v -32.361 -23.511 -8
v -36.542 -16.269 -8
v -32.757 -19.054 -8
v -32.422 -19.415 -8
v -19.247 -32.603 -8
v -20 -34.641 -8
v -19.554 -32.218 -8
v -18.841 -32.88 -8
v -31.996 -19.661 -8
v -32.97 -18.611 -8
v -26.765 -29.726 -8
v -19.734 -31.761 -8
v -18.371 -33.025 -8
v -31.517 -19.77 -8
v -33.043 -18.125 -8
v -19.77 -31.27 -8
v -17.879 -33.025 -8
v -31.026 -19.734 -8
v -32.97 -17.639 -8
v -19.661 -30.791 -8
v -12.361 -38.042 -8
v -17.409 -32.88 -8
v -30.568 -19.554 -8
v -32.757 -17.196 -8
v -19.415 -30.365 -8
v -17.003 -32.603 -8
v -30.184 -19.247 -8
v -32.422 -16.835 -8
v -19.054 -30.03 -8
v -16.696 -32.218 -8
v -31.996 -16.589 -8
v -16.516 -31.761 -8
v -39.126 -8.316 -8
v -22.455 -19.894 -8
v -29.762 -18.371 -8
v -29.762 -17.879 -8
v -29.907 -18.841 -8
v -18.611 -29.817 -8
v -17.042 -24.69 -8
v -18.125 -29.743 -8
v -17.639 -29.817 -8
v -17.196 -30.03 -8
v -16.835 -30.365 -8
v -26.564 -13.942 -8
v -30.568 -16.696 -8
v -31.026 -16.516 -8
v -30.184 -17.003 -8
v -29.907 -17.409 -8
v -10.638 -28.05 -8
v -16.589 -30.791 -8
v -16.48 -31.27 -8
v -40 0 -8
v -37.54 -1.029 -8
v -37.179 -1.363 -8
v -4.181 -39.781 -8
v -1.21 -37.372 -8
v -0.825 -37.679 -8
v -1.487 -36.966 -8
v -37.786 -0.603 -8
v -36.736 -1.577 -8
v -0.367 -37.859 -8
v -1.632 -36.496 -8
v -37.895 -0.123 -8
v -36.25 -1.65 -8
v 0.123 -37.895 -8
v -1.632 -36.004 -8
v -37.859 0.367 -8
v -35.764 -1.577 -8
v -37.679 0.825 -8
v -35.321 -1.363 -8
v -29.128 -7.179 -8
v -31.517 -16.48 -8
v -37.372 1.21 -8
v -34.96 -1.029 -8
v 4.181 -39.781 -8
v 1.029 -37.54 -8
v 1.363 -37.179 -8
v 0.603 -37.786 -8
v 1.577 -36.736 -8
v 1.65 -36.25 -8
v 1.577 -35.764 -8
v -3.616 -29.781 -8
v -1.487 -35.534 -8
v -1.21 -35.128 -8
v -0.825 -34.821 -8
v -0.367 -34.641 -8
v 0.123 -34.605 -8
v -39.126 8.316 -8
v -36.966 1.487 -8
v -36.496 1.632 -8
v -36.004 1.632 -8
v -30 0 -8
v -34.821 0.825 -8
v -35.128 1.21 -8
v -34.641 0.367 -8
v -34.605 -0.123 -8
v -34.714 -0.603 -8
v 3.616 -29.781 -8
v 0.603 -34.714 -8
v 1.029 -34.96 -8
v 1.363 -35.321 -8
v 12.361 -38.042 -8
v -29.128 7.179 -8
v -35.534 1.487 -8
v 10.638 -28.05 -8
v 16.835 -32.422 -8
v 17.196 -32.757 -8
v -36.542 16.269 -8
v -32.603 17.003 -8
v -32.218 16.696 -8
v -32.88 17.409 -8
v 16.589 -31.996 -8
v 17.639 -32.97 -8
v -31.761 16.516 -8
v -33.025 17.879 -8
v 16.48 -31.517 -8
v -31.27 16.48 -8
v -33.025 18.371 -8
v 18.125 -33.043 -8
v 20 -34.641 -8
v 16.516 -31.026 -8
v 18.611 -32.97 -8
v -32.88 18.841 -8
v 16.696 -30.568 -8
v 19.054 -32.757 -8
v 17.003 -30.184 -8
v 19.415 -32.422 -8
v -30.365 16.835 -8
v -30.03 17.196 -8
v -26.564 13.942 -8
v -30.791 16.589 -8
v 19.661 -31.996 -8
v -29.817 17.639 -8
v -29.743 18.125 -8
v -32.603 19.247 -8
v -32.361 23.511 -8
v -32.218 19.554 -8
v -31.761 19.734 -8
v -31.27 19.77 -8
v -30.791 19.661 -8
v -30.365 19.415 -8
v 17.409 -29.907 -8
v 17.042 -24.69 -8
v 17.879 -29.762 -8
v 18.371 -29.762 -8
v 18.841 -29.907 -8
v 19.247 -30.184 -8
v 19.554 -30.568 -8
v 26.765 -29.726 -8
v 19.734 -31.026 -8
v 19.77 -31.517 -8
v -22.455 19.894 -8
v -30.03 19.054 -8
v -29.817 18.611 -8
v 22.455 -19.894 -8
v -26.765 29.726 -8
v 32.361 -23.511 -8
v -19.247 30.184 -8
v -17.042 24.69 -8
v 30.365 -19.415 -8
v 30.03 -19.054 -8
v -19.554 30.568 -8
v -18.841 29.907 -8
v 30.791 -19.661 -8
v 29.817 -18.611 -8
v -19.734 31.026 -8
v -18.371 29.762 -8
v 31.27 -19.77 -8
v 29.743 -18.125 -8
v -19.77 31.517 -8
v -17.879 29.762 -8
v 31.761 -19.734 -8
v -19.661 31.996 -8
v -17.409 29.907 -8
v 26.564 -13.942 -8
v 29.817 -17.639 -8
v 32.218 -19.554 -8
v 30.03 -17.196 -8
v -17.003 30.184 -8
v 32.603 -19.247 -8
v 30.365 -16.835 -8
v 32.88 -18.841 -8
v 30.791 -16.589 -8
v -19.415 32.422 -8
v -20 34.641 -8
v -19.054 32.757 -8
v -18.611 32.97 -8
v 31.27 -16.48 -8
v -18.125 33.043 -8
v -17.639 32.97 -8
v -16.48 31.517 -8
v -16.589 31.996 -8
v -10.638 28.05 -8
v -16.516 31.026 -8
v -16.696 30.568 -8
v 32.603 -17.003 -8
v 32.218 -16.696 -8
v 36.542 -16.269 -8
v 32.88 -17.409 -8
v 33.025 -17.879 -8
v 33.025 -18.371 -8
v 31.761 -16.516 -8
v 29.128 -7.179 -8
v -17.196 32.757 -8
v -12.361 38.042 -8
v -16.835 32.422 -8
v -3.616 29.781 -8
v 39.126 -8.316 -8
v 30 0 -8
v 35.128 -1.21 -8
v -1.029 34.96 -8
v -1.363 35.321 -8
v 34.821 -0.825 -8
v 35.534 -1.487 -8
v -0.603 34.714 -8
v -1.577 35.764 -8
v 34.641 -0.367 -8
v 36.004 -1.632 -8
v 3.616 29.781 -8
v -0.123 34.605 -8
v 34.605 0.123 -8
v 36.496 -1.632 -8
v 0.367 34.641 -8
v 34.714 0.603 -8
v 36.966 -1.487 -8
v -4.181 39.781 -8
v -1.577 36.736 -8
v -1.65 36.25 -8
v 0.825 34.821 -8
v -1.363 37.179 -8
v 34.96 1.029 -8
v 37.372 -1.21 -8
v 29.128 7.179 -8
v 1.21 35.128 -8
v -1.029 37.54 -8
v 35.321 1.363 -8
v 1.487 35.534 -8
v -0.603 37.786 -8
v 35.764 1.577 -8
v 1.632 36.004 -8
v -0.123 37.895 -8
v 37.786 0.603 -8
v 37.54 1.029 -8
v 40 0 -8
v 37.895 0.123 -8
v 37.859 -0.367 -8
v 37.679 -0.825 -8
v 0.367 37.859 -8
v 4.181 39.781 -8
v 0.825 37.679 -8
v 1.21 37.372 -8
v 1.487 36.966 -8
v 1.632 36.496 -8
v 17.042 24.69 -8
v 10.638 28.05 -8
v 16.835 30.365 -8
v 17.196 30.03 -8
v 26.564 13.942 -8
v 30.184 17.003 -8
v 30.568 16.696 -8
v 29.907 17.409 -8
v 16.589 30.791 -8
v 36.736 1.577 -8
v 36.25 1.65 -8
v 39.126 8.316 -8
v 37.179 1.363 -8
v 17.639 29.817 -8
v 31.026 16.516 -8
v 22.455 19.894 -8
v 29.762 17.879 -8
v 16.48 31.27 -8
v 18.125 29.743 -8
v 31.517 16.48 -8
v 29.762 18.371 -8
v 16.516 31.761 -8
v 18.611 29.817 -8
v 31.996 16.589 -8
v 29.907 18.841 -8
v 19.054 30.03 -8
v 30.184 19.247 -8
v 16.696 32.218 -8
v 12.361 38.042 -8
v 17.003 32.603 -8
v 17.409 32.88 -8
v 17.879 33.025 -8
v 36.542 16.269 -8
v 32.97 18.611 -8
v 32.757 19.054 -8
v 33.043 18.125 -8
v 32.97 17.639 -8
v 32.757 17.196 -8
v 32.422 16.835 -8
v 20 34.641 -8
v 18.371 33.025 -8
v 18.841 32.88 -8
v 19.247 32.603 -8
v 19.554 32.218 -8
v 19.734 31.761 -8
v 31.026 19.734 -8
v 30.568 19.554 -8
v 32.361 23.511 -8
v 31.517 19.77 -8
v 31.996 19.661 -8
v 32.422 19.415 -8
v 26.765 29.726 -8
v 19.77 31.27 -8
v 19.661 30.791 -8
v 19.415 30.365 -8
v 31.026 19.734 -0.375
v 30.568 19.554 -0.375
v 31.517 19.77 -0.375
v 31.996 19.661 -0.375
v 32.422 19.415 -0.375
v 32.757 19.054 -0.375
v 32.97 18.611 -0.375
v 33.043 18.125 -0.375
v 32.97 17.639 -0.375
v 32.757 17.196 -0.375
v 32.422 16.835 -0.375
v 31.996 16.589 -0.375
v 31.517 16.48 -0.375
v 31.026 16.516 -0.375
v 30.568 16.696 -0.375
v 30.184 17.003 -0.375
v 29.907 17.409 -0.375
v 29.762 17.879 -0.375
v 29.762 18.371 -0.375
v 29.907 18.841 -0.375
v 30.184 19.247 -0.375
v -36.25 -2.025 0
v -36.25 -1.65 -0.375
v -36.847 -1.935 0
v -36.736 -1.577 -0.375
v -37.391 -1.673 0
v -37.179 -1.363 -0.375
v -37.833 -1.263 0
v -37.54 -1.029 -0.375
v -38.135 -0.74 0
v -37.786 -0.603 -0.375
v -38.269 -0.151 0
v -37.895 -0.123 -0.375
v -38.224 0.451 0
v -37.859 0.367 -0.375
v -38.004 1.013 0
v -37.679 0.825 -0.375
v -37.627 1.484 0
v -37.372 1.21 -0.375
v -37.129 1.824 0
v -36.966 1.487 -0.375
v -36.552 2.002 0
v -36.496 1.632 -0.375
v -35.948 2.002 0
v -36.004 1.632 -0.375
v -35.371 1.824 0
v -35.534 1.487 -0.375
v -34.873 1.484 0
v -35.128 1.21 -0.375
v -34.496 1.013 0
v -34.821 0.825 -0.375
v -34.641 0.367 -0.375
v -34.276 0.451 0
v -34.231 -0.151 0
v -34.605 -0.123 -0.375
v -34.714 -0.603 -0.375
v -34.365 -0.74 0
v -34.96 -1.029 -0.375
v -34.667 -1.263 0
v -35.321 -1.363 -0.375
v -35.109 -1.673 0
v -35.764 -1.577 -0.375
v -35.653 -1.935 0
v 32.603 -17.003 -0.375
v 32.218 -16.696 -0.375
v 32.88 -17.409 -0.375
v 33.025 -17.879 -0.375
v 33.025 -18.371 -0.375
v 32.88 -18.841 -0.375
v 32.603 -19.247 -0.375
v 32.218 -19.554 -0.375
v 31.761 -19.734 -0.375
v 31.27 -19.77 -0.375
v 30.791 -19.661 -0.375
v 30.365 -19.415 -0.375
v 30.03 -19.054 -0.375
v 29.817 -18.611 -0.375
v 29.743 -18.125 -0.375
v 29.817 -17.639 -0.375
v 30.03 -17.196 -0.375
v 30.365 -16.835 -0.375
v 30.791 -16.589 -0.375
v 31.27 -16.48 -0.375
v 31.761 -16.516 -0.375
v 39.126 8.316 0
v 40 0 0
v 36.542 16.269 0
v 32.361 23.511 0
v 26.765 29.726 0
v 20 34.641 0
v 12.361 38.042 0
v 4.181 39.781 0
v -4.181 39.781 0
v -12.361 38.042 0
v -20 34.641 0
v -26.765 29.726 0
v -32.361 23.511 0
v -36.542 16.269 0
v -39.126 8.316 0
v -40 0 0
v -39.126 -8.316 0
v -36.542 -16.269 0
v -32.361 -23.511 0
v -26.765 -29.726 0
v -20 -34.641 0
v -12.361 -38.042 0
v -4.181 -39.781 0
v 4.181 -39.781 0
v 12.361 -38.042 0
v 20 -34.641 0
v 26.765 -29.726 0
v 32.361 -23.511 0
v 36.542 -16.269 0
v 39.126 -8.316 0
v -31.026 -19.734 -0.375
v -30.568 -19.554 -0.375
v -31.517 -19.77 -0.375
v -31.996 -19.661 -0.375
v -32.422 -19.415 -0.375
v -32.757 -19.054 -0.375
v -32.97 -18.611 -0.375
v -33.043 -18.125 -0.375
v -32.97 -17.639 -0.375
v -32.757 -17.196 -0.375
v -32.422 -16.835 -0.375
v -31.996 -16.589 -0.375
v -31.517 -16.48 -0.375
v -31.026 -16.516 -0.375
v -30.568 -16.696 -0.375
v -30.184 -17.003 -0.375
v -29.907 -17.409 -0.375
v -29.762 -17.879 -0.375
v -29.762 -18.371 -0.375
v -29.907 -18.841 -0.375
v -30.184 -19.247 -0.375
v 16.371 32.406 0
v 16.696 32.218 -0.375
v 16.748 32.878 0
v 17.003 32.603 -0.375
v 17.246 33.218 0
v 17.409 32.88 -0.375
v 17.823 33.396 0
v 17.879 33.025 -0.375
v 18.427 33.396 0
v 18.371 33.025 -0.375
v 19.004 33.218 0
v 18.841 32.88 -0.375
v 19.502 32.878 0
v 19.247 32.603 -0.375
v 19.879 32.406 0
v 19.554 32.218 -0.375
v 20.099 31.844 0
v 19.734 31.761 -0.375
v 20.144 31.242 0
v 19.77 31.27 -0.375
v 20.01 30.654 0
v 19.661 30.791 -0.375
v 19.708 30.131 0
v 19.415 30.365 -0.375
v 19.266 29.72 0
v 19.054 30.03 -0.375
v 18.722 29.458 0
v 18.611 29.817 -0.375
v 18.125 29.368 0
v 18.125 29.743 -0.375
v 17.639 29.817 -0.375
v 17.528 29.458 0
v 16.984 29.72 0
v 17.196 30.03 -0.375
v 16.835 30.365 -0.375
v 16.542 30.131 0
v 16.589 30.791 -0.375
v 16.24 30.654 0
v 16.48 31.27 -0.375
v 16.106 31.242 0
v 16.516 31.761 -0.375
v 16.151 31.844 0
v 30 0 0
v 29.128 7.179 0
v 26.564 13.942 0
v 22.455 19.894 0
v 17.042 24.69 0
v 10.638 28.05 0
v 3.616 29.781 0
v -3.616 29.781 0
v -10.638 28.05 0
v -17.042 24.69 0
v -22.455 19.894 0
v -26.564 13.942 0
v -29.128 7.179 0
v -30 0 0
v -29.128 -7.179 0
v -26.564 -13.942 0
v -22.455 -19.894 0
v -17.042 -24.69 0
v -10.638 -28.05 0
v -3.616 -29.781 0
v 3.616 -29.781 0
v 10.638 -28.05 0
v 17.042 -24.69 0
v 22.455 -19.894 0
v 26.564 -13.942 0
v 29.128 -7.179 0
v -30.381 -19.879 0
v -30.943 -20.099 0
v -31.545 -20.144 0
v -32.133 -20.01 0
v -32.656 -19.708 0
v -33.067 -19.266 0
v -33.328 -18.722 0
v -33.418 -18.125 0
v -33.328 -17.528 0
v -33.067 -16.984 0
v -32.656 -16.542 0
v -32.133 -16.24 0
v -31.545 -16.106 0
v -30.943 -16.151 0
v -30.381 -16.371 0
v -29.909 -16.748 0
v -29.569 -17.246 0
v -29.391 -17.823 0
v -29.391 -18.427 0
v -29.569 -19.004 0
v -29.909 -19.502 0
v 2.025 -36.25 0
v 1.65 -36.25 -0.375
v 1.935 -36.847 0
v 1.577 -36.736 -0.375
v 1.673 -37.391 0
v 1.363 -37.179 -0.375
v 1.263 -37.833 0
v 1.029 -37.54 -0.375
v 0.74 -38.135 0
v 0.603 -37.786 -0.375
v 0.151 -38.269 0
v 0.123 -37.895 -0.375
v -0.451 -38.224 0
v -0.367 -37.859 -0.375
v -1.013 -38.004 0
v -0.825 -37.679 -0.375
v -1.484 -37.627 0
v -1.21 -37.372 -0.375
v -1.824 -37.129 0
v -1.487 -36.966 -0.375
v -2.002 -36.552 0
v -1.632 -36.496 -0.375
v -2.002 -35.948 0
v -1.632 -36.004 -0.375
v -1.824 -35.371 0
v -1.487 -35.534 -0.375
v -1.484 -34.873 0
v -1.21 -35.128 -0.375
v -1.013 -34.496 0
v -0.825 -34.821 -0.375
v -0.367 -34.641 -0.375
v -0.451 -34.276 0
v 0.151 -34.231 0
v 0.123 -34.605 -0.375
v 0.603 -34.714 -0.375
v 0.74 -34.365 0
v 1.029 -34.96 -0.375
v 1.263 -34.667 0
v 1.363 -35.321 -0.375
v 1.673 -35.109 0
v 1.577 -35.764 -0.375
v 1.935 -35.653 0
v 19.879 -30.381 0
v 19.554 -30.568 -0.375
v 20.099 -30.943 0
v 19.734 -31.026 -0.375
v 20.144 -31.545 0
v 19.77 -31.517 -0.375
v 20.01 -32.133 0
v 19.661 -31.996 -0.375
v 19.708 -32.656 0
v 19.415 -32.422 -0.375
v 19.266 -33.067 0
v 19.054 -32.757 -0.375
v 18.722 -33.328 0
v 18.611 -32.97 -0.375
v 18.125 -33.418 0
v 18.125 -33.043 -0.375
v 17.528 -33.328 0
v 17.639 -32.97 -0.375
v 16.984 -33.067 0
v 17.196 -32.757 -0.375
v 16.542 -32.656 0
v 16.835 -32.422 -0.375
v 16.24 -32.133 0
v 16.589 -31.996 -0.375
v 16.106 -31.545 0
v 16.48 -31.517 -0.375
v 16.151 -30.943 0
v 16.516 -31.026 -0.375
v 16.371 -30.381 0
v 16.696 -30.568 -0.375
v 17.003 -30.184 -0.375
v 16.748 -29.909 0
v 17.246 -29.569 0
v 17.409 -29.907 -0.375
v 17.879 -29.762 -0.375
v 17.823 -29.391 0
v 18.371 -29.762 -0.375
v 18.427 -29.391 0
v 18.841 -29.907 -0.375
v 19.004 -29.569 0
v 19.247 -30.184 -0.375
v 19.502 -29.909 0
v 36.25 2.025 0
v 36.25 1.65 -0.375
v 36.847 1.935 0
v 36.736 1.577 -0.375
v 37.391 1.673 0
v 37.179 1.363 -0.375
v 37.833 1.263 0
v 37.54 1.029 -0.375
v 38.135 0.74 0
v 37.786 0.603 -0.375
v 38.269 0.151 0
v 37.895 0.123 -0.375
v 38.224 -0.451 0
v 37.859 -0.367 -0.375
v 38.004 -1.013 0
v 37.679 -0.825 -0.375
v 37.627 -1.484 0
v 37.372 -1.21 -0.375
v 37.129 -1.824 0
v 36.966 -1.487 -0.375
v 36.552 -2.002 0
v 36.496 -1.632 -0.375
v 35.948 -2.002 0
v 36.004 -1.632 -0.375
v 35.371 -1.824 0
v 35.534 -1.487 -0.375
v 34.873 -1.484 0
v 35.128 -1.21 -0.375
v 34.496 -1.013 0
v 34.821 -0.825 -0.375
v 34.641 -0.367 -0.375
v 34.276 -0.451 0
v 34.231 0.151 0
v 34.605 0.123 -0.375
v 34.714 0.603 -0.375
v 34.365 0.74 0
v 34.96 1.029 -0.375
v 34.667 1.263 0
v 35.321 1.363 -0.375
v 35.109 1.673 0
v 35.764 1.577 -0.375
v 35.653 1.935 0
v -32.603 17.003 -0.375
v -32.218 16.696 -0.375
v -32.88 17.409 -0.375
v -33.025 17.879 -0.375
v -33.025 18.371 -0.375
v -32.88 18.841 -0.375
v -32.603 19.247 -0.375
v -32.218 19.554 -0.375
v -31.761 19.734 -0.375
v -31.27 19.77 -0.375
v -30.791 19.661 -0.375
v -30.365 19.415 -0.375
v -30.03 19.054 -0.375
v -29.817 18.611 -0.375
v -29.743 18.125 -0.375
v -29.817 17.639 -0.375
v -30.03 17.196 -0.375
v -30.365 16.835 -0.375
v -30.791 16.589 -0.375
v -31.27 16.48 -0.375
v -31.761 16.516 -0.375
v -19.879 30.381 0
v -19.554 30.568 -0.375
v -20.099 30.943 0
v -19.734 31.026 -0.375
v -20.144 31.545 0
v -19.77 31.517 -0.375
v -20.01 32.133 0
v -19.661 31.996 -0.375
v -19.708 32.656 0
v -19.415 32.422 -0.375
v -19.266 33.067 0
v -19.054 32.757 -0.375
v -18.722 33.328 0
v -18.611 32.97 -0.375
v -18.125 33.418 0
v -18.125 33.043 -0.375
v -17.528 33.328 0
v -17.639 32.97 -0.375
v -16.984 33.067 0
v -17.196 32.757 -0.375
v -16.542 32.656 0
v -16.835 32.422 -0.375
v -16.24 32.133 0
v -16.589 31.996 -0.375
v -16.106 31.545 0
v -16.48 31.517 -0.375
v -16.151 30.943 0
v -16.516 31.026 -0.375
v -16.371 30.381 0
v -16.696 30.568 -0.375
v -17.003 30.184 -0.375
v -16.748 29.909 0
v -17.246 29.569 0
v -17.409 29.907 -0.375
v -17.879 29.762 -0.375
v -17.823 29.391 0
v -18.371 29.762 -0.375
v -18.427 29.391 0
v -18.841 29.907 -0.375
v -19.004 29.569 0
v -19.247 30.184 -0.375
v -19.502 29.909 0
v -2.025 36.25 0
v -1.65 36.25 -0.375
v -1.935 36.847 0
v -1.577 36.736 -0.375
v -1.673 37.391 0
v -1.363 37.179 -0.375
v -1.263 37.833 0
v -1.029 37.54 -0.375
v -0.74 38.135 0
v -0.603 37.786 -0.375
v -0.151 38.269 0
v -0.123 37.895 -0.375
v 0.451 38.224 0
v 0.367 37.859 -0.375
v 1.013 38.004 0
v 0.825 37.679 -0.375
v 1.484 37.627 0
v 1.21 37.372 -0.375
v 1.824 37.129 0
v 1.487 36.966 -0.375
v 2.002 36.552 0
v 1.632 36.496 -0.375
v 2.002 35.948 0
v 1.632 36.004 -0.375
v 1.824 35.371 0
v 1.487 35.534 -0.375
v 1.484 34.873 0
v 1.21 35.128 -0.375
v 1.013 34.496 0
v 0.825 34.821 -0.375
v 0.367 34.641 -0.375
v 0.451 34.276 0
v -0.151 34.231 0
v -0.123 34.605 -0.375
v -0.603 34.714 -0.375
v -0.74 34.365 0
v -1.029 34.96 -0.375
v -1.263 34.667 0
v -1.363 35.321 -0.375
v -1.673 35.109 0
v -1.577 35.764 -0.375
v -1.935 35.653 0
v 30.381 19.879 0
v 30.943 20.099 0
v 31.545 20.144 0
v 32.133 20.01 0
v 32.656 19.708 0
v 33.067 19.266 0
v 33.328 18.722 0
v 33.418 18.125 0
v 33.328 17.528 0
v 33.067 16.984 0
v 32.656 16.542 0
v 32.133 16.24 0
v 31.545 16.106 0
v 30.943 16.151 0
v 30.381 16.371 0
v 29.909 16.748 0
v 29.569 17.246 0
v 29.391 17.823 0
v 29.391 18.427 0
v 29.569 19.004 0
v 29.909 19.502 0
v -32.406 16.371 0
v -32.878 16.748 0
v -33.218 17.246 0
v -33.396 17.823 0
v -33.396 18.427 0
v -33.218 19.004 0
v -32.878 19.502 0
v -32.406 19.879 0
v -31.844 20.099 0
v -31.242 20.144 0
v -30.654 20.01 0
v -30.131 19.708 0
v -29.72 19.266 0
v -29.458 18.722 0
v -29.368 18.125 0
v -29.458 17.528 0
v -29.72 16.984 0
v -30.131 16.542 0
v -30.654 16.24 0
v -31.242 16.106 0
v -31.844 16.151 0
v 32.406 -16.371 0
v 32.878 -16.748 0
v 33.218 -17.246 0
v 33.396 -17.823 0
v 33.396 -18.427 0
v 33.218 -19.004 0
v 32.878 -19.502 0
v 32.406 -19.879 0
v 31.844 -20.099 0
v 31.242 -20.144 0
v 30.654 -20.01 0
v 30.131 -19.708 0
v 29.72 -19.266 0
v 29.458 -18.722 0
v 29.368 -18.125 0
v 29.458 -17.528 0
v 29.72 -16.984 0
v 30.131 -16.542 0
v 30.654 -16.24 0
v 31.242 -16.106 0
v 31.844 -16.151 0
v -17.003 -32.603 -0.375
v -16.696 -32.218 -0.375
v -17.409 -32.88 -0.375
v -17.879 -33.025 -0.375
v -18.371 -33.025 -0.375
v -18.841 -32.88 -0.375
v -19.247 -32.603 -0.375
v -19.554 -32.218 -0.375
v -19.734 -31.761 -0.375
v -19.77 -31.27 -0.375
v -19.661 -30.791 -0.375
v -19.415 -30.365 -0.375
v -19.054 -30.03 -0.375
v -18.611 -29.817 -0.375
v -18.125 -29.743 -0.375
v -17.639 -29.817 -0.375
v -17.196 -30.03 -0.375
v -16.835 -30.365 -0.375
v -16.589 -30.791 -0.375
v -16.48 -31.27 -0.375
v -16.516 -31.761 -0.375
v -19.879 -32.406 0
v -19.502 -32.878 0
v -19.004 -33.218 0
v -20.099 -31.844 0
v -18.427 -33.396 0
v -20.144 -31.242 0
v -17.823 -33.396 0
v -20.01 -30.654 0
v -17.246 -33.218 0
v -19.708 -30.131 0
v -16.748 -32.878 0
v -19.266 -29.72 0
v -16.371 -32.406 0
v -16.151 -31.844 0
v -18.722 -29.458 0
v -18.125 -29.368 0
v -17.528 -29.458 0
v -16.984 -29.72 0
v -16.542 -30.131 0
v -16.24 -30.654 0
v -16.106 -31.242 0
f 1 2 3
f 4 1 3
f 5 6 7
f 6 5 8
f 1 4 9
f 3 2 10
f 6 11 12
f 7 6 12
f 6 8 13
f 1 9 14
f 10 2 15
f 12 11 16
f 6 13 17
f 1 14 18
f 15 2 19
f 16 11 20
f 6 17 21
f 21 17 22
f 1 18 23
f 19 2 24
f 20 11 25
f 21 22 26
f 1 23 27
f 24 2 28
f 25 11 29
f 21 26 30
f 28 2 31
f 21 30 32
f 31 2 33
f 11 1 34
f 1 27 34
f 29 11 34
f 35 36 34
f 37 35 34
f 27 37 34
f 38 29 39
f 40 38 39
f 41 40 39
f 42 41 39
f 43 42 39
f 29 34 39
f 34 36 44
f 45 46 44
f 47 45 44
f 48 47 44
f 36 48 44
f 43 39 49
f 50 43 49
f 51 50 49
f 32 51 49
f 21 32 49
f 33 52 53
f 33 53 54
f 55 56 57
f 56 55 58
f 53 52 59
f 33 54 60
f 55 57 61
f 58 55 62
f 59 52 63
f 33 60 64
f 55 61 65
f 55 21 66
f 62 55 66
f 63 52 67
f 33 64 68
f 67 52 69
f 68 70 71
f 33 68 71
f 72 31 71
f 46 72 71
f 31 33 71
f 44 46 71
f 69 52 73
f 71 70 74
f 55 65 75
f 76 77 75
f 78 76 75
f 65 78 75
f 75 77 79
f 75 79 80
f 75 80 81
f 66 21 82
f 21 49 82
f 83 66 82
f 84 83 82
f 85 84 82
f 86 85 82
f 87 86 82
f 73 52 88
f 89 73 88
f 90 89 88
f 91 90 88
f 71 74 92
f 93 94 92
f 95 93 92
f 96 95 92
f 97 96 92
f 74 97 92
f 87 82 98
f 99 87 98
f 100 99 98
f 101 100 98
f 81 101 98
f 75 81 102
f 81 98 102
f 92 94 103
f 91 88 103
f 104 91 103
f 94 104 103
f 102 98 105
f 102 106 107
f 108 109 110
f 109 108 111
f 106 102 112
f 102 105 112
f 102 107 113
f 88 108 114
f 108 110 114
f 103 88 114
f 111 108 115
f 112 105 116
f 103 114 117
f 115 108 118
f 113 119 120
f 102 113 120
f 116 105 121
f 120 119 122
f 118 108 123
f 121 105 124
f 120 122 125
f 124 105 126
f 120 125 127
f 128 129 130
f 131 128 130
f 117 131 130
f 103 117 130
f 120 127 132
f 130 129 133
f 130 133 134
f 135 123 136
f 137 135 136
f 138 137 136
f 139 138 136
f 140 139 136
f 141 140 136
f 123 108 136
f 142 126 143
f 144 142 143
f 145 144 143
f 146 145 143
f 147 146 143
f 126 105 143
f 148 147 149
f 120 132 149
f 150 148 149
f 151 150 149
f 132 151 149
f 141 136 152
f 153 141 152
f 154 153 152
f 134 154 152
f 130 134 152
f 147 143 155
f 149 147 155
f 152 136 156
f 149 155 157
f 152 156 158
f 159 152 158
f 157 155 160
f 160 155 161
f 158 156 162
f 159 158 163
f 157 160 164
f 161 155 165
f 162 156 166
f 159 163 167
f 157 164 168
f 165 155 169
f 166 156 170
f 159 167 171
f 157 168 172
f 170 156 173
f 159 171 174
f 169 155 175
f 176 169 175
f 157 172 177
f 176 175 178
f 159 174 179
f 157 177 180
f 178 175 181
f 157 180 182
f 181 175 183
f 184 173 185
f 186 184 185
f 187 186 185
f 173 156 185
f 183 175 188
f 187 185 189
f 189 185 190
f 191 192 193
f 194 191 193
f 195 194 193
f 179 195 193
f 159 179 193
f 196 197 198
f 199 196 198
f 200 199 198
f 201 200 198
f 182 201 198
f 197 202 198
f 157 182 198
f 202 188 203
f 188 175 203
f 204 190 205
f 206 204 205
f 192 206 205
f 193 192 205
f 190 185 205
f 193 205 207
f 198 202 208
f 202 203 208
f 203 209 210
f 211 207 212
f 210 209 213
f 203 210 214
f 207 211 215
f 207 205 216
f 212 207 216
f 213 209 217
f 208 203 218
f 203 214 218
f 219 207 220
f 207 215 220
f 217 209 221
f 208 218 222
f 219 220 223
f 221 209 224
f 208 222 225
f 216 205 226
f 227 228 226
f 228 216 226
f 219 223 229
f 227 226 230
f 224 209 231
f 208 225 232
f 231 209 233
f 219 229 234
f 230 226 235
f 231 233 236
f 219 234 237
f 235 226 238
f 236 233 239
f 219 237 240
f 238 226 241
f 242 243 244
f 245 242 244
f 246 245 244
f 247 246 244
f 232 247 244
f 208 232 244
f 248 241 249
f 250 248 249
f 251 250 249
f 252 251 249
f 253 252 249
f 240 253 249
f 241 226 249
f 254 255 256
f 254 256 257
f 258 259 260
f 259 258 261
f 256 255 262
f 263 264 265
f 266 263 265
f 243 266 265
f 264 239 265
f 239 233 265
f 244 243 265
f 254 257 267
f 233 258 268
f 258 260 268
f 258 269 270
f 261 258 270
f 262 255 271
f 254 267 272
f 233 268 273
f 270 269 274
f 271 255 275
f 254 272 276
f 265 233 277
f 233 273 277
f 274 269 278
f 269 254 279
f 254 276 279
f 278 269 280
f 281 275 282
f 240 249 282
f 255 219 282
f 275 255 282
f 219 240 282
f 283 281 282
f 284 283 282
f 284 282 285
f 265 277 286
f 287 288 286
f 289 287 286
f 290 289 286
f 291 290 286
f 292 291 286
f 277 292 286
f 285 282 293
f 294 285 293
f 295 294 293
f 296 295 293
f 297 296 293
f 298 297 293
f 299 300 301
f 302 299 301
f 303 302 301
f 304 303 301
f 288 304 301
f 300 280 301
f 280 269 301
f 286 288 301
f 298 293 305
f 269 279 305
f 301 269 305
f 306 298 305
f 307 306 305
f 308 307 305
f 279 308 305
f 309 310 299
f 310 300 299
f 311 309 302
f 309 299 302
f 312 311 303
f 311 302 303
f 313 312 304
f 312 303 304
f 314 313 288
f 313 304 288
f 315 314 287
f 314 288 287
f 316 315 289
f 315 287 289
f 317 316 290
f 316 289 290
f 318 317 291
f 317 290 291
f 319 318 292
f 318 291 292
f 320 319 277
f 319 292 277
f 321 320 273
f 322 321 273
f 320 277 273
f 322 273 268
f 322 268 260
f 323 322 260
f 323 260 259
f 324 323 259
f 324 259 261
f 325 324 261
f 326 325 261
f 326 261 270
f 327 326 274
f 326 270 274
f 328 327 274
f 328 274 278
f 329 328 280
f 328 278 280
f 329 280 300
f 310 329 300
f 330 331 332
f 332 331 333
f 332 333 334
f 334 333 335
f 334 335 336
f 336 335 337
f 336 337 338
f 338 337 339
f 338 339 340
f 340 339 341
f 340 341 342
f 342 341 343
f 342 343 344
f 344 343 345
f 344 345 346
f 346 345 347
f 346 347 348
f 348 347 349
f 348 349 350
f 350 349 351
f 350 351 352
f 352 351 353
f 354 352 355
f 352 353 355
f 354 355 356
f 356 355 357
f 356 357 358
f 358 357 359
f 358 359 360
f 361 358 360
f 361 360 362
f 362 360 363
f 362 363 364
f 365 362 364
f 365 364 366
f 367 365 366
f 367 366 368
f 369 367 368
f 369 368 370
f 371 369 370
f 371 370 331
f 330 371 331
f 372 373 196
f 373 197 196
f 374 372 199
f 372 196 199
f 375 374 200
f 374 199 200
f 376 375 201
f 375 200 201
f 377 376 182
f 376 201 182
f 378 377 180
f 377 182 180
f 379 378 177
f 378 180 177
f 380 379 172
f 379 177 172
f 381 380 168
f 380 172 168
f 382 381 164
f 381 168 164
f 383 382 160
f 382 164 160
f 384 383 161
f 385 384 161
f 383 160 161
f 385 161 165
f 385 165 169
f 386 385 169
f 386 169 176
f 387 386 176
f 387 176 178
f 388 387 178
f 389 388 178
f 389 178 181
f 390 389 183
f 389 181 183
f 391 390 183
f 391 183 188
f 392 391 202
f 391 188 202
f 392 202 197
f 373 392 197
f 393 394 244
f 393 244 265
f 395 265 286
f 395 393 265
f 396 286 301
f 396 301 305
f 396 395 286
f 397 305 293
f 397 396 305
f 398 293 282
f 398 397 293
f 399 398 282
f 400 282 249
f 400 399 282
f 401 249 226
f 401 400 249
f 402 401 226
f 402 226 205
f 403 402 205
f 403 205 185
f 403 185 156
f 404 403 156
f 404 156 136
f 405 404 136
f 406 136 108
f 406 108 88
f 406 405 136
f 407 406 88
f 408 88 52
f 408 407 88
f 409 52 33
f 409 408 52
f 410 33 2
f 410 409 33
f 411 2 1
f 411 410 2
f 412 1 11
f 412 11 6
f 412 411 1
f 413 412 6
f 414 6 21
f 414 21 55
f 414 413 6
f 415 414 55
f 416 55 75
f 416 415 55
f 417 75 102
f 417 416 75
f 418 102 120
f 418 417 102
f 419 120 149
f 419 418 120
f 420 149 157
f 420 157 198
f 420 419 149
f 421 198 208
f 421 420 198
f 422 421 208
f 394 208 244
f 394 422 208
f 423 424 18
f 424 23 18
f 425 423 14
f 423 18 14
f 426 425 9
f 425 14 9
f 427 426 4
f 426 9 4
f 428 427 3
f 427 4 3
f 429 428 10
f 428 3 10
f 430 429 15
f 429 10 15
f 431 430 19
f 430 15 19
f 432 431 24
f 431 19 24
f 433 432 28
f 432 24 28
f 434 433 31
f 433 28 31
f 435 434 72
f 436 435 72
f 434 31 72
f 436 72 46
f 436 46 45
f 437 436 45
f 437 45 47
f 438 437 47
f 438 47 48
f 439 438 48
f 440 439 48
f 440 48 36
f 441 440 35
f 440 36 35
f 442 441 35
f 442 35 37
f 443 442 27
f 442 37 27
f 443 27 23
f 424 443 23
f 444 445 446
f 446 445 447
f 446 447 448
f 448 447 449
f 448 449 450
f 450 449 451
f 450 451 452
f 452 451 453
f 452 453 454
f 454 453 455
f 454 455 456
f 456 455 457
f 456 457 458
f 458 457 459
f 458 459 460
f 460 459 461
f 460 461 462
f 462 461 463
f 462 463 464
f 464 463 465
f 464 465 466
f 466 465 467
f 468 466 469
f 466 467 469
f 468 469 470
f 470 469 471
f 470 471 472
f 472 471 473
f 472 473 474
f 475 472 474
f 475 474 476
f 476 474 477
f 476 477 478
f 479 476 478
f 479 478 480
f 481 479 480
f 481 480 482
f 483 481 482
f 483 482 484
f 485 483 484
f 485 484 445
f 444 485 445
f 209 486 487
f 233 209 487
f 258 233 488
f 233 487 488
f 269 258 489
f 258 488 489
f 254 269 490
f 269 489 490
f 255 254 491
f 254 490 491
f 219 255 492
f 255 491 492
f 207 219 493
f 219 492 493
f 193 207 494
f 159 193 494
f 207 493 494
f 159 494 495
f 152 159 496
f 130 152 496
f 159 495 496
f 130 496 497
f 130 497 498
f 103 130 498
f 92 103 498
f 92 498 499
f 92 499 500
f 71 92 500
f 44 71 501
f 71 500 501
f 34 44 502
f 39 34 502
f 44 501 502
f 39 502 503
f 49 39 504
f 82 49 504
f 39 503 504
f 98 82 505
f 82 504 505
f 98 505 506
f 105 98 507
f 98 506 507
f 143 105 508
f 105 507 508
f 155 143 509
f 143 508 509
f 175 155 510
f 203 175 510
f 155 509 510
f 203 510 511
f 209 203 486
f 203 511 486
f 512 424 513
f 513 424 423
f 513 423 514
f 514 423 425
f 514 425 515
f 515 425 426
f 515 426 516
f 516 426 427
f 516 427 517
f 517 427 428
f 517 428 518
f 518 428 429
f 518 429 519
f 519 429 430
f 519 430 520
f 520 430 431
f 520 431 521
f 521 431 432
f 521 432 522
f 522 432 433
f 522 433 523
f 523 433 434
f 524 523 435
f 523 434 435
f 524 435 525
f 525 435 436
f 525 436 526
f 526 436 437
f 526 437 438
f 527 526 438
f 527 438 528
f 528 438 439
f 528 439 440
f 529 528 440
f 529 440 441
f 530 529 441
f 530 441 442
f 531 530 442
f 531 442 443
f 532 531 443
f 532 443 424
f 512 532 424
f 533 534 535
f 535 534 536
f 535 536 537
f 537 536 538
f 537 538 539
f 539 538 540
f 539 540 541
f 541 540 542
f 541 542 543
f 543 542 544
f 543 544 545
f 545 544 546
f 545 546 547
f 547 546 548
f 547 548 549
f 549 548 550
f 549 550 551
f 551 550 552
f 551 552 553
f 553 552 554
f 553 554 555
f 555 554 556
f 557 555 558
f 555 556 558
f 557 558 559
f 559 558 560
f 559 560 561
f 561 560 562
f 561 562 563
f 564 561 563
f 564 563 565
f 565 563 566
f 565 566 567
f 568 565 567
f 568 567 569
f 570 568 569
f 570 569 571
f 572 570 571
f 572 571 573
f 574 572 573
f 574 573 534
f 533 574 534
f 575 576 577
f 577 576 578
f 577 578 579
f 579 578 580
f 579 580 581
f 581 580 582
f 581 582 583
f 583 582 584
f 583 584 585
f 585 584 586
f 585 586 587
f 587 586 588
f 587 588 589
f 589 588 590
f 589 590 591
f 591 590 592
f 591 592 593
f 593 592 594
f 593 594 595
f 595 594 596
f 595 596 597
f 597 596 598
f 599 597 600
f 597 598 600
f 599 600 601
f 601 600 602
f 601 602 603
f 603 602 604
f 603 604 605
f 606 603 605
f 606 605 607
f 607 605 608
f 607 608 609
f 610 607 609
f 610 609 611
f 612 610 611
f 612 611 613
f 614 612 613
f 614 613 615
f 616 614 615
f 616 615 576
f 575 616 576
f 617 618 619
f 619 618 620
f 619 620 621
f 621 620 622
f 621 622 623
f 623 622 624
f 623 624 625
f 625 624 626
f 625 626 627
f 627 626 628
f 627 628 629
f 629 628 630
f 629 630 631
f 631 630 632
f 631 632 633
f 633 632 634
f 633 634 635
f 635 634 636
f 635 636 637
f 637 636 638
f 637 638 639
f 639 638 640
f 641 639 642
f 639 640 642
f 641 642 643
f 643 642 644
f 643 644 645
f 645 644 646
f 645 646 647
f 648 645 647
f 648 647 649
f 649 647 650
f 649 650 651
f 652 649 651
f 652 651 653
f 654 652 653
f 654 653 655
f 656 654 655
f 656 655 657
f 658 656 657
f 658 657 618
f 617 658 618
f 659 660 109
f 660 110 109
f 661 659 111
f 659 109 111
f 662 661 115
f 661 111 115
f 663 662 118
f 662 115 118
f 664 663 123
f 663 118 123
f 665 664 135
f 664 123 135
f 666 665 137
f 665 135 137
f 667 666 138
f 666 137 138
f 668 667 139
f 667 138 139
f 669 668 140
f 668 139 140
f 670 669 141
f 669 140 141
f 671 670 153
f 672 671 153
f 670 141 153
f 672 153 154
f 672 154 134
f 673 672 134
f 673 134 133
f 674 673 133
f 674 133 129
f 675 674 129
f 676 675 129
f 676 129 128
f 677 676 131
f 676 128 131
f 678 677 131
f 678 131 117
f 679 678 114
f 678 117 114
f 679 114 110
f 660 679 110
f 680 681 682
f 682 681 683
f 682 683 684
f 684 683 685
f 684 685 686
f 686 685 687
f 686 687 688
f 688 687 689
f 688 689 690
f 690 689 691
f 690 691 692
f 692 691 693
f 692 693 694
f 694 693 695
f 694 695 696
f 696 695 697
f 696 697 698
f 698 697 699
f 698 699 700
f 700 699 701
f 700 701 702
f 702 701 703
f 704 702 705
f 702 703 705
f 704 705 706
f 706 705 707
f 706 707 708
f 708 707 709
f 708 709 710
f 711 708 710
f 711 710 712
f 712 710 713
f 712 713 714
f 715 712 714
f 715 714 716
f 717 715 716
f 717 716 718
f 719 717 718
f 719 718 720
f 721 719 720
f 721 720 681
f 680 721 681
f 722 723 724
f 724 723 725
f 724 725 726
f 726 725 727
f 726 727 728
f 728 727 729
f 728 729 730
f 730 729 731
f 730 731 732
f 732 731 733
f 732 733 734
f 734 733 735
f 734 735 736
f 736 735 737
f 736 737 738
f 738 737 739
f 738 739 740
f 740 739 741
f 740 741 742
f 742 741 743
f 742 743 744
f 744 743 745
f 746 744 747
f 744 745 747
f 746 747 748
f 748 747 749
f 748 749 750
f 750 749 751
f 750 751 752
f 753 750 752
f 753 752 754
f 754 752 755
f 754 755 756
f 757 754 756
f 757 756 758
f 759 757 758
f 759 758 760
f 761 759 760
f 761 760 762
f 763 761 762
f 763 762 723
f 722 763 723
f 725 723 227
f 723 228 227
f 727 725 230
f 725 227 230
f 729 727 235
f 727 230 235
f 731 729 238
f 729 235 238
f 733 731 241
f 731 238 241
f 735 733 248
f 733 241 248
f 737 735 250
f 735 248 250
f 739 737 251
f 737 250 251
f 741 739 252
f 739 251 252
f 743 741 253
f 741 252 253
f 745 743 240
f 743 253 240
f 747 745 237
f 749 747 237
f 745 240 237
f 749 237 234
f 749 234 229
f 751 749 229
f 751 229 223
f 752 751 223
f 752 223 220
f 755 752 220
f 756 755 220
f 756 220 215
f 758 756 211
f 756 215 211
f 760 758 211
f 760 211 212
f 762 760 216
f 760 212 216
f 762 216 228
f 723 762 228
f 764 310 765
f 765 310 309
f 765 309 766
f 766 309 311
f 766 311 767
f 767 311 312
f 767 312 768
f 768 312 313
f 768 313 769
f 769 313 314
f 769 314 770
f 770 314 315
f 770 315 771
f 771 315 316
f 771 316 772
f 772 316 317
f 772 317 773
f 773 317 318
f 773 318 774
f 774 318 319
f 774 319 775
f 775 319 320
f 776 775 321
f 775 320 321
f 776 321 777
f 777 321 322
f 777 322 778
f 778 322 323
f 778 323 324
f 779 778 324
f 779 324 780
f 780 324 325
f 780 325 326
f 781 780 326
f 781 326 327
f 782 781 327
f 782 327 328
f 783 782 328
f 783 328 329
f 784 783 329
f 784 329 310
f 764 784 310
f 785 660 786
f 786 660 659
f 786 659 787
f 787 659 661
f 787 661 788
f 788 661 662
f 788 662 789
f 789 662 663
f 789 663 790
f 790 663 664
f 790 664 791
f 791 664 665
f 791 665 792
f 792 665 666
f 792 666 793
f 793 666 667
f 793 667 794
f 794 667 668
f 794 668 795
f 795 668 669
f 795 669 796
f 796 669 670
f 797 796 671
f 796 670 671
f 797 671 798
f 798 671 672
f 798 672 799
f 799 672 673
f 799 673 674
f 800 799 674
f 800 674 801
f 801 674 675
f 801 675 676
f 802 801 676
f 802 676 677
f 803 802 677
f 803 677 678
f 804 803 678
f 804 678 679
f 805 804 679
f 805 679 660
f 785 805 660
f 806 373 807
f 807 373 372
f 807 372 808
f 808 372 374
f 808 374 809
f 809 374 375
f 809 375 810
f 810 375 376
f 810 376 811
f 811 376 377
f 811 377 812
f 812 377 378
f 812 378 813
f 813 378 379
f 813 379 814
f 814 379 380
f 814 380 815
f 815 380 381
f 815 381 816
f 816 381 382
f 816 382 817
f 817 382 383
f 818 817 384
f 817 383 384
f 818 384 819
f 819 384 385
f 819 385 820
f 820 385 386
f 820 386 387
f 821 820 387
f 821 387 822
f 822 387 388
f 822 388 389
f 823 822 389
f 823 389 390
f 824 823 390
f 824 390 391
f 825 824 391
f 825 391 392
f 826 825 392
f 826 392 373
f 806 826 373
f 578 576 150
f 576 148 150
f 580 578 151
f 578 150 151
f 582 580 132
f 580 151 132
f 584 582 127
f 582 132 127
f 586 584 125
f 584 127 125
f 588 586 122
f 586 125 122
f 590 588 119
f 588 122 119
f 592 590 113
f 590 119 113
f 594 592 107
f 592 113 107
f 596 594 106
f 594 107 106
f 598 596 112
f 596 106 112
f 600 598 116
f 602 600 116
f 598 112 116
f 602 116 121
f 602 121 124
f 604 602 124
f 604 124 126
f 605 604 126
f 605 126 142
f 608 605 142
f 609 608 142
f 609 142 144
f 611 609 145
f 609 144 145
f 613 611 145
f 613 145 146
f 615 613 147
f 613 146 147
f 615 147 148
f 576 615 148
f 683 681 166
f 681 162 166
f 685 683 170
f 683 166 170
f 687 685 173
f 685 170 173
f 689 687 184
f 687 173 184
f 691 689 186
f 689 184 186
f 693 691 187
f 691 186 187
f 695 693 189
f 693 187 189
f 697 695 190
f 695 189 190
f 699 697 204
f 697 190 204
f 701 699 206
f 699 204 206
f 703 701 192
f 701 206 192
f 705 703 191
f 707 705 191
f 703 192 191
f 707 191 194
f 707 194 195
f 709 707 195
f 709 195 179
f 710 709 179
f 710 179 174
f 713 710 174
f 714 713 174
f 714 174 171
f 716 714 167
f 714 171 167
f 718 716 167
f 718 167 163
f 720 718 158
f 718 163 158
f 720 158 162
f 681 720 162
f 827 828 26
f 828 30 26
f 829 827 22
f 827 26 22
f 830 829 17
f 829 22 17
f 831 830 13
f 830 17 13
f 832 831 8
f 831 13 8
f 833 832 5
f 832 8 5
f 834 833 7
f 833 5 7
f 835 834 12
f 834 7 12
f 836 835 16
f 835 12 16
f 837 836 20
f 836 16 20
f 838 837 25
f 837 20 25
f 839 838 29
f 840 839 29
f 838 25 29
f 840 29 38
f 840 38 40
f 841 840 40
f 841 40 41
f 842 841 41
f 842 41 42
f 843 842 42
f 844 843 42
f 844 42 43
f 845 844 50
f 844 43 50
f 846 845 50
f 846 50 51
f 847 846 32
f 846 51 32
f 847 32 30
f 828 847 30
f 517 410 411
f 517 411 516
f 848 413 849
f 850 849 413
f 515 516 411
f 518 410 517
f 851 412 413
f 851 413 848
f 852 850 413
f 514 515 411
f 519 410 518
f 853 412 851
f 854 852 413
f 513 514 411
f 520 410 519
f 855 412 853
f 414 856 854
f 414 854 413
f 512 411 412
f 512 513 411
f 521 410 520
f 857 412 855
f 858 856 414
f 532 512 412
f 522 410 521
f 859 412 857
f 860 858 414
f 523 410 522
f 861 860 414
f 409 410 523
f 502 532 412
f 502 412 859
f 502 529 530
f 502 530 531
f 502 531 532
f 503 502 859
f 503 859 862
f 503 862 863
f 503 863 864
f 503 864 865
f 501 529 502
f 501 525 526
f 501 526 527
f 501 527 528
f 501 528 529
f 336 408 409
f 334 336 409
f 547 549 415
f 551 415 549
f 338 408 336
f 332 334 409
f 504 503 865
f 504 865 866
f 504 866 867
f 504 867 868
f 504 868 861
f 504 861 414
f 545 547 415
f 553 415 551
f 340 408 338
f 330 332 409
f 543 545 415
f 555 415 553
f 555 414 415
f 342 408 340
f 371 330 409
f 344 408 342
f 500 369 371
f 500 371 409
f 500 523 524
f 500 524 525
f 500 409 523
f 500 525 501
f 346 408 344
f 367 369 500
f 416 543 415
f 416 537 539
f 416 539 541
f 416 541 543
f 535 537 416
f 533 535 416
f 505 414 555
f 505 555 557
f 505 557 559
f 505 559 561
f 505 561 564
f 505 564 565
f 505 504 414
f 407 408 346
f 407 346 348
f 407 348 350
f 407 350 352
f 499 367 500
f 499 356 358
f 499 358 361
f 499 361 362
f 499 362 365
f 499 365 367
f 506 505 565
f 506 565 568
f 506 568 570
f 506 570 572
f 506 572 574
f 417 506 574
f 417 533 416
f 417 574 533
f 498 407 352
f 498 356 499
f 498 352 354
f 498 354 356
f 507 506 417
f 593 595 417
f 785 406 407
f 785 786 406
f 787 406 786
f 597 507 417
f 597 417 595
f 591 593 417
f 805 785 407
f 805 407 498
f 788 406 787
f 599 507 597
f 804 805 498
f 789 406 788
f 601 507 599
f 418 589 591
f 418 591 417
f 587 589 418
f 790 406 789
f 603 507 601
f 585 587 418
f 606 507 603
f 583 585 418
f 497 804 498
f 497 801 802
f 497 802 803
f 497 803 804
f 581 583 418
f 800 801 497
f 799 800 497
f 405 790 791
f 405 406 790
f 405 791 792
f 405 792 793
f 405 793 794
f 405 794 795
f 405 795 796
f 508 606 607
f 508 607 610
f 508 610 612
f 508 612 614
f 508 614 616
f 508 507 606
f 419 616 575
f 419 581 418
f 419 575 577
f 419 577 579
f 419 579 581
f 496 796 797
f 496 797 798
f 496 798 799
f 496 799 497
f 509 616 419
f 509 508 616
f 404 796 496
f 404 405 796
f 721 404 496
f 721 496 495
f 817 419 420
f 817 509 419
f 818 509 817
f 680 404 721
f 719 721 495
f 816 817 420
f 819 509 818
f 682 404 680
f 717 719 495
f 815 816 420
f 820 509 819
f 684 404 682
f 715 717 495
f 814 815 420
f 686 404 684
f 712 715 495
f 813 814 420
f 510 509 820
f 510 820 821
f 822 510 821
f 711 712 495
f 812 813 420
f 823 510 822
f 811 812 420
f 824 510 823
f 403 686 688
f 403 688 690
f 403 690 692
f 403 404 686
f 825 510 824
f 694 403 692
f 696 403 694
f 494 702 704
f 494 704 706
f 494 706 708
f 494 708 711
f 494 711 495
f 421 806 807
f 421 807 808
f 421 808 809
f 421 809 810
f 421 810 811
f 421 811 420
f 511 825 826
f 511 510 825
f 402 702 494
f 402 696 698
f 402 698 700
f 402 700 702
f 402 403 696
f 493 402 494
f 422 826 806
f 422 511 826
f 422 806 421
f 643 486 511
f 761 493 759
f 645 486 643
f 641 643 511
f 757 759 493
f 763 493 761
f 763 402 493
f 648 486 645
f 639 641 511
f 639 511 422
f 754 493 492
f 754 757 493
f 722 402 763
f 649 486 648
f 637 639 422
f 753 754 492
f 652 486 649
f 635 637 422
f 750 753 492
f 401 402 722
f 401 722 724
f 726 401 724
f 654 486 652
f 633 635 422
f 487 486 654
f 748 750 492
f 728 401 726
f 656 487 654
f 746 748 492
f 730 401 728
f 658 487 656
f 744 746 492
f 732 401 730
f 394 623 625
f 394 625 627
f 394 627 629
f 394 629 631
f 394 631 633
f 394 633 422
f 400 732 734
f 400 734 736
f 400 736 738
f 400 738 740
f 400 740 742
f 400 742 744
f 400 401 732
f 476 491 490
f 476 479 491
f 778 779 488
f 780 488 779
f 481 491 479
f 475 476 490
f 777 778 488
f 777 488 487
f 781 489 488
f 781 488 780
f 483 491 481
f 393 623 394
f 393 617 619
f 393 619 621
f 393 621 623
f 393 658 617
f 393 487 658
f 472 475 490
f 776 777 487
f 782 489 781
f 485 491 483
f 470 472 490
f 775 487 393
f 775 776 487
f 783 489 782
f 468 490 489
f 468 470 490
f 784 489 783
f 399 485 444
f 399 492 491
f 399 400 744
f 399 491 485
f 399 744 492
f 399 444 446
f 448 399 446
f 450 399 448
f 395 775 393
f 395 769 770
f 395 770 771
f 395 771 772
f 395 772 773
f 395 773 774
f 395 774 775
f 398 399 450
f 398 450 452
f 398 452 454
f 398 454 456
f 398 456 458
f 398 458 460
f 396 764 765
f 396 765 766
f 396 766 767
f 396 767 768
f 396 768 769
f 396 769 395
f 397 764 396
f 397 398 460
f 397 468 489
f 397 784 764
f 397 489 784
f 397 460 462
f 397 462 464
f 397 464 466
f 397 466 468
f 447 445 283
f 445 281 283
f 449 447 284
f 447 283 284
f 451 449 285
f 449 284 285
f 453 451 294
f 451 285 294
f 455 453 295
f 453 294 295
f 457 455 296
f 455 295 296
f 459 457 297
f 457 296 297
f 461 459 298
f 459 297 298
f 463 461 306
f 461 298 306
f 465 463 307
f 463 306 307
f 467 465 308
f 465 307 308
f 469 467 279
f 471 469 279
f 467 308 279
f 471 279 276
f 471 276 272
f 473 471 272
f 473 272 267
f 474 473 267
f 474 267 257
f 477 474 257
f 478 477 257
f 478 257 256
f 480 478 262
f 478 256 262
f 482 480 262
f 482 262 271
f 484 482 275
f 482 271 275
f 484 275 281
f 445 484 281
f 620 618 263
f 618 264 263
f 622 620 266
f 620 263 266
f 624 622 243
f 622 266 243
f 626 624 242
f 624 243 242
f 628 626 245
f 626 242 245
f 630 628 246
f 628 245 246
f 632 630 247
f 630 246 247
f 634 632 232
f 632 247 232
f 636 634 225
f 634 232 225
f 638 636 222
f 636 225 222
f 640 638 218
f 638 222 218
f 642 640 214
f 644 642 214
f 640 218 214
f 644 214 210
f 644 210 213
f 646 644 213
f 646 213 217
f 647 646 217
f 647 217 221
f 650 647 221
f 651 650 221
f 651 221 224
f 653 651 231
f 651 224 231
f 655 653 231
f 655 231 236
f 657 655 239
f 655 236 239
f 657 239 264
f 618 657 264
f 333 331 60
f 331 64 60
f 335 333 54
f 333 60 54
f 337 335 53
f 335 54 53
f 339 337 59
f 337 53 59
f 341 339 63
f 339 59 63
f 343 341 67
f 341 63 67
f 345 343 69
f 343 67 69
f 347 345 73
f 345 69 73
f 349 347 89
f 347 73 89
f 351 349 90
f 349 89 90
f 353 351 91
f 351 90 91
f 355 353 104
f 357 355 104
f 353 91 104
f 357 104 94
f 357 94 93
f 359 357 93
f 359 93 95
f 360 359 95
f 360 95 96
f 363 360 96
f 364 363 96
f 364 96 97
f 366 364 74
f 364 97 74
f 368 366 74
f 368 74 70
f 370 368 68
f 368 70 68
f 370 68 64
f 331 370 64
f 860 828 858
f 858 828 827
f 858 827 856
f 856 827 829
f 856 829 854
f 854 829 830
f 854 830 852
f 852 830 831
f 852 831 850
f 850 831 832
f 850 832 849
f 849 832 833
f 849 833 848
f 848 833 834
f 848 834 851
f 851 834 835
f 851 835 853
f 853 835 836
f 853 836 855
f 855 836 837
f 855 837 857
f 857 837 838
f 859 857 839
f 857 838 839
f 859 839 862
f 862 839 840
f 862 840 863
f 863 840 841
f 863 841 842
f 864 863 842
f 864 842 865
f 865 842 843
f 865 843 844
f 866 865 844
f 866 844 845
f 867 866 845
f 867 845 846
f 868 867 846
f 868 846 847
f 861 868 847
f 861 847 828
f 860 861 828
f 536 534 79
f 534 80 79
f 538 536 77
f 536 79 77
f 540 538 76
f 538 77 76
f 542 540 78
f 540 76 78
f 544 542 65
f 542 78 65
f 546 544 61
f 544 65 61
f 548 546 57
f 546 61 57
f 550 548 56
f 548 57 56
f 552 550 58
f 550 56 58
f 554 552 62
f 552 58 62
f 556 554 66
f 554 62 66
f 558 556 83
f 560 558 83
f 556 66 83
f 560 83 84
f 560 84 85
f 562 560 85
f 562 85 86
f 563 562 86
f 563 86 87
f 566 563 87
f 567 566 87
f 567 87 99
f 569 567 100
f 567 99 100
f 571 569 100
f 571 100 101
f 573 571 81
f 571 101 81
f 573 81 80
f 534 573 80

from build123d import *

# Parameters (mm, degrees)
SKETCH1_R                       = 40
SKETCH1_R_2                     = 30
BOSS_EXTRUDE1_DEPTH             = 8
M4X0_7_TAPPED_HOLE1_D           = 3.3
M4X0_7_TAPPED_HOLE1_CSINK_D     = 4.05
M4X0_7_TAPPED_HOLE1_CSINK_ANGLE = 90
CIRPATTERN1_COUNT               = 12


with BuildPart() as part:
    # Sketch1 → Boss-Extrude1 (new body)
    with BuildSketch(Plane.XY):
        Circle(SKETCH1_R)
        Circle(SKETCH1_R_2, mode=Mode.SUBTRACT)
    extrude(amount=-BOSS_EXTRUDE1_DEPTH)

    # M4x0.7 Tapped Hole1 (through all)
    with Locations(Plane.XY):
        with Locations((0, 36.25)):
            m4x0_7_tapped_hole1 = CounterSinkHole(M4X0_7_TAPPED_HOLE1_D / 2, M4X0_7_TAPPED_HOLE1_CSINK_D / 2, counter_sink_angle=M4X0_7_TAPPED_HOLE1_CSINK_ANGLE)

    # CirPattern1: M4x0.7 Tapped Hole1 ×12 about axis
    cirpattern1_axis = Axis((0, 0, 0), (0, 0, 1))
    for i in range(1, CIRPATTERN1_COUNT):
        add(m4x0_7_tapped_hole1.rotate(cirpattern1_axis, i * 360 / CIRPATTERN1_COUNT), mode=Mode.SUBTRACT)


solid = part.part
